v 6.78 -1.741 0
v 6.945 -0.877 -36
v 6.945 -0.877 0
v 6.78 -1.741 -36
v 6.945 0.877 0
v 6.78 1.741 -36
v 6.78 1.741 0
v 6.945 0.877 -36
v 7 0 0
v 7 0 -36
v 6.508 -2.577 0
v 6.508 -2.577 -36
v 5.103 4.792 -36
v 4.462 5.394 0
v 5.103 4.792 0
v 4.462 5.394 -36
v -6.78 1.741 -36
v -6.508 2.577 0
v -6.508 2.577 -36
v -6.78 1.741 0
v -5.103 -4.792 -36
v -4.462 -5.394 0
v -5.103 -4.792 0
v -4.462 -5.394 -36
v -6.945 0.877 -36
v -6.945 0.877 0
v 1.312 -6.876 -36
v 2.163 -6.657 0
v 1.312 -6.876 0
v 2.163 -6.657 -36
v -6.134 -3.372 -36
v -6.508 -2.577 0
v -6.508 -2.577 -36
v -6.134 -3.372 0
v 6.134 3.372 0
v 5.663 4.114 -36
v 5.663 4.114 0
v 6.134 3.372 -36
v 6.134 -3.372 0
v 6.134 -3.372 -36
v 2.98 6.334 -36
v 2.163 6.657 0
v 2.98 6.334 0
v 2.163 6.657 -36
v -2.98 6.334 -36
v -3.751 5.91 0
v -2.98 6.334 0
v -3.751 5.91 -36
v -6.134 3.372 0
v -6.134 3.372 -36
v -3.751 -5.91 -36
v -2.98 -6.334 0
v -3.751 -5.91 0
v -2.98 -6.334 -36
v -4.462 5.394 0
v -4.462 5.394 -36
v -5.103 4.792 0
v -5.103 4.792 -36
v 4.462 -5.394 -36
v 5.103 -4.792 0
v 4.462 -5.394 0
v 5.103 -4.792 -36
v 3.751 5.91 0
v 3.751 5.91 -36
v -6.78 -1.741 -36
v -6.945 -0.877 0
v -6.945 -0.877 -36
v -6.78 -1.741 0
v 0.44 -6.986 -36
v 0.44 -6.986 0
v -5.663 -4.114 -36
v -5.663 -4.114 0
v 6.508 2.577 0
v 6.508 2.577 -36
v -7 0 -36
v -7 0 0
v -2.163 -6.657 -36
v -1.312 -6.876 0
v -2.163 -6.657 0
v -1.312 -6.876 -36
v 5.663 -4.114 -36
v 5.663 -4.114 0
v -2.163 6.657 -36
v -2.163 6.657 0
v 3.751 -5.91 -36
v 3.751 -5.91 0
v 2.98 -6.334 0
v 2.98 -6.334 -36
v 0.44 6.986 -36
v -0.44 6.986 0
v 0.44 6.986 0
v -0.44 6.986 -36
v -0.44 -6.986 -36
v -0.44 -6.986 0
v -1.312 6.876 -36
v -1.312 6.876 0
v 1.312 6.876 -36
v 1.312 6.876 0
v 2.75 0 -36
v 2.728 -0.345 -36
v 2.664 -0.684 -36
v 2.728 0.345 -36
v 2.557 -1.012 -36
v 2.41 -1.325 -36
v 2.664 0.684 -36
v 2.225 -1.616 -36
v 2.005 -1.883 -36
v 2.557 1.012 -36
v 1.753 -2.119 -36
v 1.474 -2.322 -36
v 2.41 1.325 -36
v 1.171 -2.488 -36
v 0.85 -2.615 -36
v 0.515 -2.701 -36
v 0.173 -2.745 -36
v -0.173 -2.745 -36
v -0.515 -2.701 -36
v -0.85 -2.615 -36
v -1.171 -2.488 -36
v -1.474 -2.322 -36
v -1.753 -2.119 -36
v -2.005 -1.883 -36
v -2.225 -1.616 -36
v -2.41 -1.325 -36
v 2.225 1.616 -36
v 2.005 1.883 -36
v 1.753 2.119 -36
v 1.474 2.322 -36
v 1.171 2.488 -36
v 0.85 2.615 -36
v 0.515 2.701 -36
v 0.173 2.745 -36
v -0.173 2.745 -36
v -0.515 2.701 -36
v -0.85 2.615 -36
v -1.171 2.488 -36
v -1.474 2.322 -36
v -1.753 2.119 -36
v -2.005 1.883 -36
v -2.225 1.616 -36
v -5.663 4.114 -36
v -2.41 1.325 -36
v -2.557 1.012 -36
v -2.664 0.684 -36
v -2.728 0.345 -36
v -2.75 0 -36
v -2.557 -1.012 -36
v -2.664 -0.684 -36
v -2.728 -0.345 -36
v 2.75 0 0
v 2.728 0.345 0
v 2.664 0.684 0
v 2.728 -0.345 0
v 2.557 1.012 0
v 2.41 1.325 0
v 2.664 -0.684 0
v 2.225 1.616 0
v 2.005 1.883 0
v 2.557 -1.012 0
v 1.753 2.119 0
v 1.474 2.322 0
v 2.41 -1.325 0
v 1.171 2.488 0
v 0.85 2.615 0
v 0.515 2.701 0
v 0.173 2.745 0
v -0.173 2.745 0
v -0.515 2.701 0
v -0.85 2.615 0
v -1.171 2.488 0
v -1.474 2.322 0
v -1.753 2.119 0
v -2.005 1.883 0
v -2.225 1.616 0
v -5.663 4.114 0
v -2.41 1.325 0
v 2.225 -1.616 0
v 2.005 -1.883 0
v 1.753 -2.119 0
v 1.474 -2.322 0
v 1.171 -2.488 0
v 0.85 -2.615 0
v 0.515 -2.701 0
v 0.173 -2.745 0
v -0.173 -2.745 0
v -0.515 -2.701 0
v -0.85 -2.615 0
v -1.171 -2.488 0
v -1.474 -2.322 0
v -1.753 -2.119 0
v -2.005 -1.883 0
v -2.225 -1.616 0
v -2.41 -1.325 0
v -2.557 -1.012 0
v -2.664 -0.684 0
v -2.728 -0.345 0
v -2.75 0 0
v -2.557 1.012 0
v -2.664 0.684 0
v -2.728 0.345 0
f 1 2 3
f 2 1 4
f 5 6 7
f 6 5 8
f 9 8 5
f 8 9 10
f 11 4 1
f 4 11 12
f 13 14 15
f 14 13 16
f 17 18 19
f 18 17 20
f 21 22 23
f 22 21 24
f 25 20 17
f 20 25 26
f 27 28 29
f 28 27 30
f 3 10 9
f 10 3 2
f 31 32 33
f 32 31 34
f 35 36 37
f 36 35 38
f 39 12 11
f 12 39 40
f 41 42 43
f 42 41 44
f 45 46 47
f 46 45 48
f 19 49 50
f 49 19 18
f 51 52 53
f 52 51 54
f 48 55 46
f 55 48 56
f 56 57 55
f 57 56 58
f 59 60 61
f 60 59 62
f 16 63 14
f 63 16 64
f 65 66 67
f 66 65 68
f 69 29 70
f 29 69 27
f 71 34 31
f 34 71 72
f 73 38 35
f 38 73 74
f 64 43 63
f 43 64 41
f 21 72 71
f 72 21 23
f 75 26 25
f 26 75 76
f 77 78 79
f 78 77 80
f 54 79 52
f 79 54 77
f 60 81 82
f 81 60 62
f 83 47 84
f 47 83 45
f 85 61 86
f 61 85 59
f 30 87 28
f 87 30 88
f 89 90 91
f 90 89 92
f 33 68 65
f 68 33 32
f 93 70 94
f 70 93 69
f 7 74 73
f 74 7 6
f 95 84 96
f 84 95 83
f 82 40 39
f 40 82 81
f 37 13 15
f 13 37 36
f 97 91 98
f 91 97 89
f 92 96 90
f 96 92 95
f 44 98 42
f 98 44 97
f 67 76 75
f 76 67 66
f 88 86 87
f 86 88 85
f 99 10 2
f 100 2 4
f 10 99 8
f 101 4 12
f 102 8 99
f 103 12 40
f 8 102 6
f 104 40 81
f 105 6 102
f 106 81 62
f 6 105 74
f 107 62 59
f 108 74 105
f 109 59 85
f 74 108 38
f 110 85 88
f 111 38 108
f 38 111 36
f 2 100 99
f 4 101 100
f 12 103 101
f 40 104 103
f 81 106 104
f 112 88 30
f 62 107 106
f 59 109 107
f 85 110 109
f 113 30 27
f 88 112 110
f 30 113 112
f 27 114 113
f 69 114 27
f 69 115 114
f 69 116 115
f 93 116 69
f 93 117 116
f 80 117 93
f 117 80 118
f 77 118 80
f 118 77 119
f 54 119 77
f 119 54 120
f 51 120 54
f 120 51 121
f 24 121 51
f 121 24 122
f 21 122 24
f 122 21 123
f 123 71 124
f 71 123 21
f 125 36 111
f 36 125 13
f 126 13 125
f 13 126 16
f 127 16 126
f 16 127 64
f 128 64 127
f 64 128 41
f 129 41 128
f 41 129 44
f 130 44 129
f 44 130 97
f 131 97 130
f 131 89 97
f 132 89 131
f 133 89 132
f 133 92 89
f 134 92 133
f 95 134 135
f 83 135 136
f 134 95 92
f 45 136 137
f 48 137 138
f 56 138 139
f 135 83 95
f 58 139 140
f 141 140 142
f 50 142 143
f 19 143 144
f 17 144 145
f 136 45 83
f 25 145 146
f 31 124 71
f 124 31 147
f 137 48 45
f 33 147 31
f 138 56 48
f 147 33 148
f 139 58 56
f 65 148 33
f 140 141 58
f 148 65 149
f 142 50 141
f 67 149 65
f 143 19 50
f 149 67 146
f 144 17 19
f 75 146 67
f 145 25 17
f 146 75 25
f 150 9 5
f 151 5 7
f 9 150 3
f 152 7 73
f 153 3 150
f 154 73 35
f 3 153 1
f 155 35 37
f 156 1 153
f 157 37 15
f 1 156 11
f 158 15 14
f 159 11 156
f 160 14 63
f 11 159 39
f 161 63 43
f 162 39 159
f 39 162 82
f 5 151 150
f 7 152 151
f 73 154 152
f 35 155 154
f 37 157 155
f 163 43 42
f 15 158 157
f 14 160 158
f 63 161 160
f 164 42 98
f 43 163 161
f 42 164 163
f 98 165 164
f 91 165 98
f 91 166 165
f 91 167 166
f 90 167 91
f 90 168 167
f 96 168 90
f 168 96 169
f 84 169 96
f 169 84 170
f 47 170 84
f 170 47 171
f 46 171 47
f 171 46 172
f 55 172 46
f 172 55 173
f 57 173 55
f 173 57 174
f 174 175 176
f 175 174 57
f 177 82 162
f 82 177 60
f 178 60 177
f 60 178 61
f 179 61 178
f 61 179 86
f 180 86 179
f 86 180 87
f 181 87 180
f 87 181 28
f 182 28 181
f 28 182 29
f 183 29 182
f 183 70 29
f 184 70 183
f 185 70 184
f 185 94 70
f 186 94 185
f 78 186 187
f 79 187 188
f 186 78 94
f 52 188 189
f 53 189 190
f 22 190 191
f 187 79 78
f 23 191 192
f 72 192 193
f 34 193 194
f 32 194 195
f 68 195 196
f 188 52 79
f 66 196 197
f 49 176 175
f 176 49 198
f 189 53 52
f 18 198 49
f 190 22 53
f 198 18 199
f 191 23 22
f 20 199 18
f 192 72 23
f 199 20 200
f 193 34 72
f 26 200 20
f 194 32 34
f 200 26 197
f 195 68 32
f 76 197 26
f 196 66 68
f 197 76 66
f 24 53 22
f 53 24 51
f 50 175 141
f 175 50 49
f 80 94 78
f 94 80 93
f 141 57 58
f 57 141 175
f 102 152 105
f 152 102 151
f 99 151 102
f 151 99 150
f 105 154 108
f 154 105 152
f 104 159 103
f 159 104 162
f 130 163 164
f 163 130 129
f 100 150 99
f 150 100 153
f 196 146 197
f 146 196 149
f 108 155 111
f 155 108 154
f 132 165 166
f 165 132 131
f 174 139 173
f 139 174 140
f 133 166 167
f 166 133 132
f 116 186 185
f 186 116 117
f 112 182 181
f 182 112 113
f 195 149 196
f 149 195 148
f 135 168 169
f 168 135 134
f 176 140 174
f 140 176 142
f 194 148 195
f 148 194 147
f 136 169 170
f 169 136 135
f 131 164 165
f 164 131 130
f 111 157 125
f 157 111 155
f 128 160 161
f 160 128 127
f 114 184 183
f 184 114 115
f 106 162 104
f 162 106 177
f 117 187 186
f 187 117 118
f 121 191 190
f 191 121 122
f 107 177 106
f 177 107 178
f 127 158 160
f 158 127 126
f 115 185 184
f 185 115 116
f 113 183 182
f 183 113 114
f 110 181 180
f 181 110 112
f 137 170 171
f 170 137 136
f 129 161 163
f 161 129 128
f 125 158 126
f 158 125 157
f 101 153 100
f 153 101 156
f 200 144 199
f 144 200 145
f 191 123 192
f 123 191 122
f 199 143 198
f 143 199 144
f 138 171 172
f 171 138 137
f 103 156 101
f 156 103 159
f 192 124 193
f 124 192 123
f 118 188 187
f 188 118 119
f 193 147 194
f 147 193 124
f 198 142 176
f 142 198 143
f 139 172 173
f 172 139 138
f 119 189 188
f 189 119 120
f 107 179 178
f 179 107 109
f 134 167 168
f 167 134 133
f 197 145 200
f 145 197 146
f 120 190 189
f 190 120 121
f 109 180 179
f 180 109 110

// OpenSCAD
$fn = 50;


difference() {
	union() {
		translate(v = [0, 0, -36.0000000000]) {
			cylinder(h = 36, r = 7.0000000000);
		}
	}
	union() {
		#translate(v = [0, 0, -36]) {
			cylinder(h = 36, r = 2.7500000000);
		}
	}
}
